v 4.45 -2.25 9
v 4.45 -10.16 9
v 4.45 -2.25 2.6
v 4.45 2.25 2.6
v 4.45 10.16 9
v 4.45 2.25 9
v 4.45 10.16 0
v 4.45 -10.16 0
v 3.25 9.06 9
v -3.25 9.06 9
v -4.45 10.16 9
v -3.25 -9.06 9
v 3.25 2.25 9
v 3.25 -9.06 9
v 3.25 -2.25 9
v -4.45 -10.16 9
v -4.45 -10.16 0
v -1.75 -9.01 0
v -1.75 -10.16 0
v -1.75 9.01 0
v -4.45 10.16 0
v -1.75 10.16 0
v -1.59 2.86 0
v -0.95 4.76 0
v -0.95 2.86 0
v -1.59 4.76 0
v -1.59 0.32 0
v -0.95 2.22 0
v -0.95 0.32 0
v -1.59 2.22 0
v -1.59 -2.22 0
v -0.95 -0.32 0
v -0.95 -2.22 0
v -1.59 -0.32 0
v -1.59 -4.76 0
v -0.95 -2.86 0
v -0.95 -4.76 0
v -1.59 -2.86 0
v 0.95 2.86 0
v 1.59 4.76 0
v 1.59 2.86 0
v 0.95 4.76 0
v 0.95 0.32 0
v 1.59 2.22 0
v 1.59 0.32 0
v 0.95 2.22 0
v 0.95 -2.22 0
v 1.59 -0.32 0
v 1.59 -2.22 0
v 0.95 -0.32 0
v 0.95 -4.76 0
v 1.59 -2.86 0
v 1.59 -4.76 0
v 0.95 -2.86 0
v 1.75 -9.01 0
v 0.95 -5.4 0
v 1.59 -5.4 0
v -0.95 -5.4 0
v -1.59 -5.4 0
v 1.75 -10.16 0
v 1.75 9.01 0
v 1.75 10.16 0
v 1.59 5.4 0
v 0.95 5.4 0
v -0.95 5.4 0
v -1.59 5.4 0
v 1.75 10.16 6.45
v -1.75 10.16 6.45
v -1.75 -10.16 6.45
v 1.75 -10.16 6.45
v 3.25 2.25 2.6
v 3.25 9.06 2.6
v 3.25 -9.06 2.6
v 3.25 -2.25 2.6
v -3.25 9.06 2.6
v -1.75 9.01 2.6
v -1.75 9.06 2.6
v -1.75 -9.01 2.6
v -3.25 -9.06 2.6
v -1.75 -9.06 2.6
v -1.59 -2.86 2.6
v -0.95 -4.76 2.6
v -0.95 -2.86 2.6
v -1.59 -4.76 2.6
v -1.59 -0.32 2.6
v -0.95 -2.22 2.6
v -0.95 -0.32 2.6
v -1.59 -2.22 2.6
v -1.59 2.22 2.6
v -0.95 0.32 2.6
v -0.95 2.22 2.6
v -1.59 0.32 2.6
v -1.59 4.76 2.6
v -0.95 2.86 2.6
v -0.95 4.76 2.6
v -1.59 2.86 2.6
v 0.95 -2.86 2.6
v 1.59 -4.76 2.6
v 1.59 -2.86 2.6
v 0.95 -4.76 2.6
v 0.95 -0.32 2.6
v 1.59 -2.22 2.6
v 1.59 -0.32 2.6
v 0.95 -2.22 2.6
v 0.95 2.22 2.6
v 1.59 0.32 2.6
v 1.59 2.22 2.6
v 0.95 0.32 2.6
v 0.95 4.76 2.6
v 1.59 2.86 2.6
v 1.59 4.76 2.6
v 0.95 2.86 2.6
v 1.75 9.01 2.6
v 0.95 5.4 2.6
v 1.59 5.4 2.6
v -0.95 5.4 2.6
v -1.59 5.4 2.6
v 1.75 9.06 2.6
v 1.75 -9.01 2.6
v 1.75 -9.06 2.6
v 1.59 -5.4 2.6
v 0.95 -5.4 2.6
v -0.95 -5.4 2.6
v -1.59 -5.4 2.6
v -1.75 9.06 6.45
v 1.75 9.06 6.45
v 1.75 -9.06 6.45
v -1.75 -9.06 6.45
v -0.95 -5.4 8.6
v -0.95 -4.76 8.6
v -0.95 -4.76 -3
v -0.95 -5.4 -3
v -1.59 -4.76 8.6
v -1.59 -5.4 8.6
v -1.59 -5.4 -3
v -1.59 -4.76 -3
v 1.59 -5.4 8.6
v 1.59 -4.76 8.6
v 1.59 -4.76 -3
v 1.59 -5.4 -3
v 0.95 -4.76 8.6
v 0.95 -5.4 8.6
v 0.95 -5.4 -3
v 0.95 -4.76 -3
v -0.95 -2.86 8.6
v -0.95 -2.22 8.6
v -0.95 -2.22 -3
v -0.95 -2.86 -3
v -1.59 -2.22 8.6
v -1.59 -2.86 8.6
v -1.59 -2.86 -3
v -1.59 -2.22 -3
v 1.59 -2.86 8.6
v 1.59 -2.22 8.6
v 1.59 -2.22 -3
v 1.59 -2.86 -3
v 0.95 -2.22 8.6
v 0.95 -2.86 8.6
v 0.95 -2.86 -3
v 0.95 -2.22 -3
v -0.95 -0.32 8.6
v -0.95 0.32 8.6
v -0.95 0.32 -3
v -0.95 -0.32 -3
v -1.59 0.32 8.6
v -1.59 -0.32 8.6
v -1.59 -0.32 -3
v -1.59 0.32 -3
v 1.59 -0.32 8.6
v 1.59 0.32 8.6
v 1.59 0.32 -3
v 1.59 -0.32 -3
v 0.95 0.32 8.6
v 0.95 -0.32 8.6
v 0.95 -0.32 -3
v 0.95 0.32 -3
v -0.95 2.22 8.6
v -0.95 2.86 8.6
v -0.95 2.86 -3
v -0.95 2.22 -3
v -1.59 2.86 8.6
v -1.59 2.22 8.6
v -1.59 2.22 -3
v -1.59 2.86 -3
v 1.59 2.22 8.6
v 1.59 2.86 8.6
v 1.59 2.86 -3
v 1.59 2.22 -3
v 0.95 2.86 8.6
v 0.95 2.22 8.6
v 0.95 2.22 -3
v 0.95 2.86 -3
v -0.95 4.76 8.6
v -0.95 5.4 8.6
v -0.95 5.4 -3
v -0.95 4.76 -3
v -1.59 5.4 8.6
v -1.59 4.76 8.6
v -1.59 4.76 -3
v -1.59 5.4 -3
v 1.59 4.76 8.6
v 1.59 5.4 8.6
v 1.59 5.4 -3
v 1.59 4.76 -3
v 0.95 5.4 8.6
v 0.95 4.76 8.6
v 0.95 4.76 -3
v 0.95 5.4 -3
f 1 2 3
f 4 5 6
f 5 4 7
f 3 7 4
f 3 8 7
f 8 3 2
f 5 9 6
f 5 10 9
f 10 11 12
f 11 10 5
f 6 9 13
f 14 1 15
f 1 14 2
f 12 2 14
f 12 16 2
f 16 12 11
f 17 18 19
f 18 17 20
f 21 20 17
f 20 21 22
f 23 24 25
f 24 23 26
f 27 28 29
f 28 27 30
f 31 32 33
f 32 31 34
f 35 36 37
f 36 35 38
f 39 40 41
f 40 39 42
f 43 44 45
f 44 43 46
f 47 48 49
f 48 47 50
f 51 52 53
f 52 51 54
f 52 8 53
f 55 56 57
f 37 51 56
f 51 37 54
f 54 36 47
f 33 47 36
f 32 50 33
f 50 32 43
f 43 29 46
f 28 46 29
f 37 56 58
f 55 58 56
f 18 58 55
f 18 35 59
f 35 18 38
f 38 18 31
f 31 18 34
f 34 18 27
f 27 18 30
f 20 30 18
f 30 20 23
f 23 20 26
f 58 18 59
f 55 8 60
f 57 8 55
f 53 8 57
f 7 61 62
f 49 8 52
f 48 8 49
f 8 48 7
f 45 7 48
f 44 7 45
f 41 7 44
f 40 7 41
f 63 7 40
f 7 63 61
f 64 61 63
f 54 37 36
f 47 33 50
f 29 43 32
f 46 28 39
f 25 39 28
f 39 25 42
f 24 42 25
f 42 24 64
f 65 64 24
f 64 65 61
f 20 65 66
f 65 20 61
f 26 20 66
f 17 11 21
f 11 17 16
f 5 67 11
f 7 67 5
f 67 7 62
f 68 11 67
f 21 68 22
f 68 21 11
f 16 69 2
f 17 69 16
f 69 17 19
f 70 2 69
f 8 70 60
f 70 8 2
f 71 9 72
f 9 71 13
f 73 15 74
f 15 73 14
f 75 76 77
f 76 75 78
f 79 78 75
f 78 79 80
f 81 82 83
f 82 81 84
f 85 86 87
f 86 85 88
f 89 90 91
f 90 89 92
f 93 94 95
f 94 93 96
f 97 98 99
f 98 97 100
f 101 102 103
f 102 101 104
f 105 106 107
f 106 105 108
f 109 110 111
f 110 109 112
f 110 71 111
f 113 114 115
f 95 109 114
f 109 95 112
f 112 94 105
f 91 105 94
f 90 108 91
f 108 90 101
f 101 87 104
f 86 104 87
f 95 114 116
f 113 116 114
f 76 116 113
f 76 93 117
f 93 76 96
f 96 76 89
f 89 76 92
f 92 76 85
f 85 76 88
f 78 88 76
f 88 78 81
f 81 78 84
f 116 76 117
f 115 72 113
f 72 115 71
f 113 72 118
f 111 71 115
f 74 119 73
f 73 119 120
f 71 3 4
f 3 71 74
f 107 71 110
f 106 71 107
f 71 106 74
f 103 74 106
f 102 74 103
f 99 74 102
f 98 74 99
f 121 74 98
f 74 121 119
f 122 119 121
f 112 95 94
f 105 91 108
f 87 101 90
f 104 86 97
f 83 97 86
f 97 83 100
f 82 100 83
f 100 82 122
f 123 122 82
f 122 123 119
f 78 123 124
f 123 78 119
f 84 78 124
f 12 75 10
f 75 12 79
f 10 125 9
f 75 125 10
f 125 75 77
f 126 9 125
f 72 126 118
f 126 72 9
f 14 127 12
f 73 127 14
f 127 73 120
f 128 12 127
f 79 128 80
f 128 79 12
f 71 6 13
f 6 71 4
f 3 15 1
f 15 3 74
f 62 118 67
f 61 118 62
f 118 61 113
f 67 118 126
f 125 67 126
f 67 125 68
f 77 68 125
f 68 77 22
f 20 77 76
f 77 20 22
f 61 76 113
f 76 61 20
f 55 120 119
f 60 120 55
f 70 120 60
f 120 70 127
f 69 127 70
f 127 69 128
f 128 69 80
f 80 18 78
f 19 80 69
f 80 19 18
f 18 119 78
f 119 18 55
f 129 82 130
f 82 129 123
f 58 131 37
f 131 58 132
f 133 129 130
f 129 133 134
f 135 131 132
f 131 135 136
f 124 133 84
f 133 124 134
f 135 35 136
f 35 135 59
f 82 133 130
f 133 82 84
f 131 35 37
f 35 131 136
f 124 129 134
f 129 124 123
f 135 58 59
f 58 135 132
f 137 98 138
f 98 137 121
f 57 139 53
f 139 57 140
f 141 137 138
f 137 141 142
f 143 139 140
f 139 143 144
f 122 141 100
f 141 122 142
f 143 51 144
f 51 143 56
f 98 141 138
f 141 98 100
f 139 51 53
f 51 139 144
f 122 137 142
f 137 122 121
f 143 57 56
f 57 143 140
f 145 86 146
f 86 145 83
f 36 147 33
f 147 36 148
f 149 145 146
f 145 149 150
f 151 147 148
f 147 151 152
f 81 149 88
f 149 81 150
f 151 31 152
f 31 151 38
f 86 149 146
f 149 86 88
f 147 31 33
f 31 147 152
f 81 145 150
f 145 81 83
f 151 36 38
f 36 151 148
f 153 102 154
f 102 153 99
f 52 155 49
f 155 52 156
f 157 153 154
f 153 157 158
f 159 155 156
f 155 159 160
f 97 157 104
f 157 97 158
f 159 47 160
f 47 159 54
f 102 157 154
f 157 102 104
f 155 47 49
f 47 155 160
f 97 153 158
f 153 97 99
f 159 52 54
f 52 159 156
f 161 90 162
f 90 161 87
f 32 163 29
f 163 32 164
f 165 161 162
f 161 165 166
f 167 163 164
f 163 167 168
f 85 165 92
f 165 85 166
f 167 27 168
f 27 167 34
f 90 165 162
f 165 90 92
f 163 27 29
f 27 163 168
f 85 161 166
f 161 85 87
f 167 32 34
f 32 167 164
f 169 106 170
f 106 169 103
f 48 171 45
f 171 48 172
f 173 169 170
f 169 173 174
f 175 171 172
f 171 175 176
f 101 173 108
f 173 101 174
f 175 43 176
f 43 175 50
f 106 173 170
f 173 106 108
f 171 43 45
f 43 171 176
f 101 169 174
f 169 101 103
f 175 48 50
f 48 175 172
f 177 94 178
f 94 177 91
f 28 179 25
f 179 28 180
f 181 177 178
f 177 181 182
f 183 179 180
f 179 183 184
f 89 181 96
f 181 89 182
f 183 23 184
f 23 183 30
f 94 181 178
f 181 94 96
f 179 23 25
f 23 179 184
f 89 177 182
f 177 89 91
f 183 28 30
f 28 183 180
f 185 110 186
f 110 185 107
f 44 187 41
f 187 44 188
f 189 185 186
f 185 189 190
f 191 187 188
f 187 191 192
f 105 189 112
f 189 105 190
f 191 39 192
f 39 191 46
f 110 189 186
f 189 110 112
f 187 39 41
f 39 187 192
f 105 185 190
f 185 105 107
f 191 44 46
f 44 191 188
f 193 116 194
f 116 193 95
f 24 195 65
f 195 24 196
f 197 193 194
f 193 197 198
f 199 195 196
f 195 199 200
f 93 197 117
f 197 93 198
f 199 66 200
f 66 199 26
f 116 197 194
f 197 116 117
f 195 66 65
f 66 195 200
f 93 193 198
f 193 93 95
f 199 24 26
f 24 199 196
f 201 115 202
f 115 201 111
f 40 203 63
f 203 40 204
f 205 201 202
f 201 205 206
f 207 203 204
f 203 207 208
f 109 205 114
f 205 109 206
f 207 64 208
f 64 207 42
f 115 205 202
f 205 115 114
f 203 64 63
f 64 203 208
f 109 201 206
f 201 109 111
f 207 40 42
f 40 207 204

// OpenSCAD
pos=10;
outLen=2.54*pos/2+7.62;
inLen=2.54*pos/2+5.42;
outWidth=8.9; //outer dimension width
inWidth=6.5; //inner dimension width
wallThickLen=(outWidth-inWidth)/2; //wall thickness in length
wallThickWidth=(outWidth-inWidth)/2; //wall thickness in width

inHeight=6.4;
outHeight=9;
fudge=0.1;

firstPinPos=-(2.54*(pos/2-1))/2;
echo(firstPinPos);

color("darkgrey") difference(){
    translate([0,0,9/2]) cube([outWidth,outLen,outHeight],true); //outer
    translate([0,0,6.4/2+9-6.4+fudge/2]) cube([6.5,inLen,inHeight+fudge],true); //inner
    translate([(6.5+wallThickWidth)/2+fudge/4,0,6.4/2+9-6.4+fudge/2]) cube([wallThickWidth+fudge,4.5,inHeight+fudge],true); //locking
    translate([0,(inLen+wallThickLen)/2,inHeight/2]) cube([3.5,wallThickLen+fudge,inHeight+fudge],true); //grasps
    translate([0,-(inLen+wallThickLen)/2,inHeight/2]) cube([3.5,wallThickLen+fudge,inHeight+fudge],true); //grasps
}
for (i=[0:pos/2-1]){
    echo (i);
    translate([-1.27,firstPinPos+i*2.54,11.6/2-3]) cube([0.64,0.64,11.6],true);
    translate([1.27,firstPinPos+i*2.54,11.6/2-3]) cube([0.64,0.64,11.6],true);
}
